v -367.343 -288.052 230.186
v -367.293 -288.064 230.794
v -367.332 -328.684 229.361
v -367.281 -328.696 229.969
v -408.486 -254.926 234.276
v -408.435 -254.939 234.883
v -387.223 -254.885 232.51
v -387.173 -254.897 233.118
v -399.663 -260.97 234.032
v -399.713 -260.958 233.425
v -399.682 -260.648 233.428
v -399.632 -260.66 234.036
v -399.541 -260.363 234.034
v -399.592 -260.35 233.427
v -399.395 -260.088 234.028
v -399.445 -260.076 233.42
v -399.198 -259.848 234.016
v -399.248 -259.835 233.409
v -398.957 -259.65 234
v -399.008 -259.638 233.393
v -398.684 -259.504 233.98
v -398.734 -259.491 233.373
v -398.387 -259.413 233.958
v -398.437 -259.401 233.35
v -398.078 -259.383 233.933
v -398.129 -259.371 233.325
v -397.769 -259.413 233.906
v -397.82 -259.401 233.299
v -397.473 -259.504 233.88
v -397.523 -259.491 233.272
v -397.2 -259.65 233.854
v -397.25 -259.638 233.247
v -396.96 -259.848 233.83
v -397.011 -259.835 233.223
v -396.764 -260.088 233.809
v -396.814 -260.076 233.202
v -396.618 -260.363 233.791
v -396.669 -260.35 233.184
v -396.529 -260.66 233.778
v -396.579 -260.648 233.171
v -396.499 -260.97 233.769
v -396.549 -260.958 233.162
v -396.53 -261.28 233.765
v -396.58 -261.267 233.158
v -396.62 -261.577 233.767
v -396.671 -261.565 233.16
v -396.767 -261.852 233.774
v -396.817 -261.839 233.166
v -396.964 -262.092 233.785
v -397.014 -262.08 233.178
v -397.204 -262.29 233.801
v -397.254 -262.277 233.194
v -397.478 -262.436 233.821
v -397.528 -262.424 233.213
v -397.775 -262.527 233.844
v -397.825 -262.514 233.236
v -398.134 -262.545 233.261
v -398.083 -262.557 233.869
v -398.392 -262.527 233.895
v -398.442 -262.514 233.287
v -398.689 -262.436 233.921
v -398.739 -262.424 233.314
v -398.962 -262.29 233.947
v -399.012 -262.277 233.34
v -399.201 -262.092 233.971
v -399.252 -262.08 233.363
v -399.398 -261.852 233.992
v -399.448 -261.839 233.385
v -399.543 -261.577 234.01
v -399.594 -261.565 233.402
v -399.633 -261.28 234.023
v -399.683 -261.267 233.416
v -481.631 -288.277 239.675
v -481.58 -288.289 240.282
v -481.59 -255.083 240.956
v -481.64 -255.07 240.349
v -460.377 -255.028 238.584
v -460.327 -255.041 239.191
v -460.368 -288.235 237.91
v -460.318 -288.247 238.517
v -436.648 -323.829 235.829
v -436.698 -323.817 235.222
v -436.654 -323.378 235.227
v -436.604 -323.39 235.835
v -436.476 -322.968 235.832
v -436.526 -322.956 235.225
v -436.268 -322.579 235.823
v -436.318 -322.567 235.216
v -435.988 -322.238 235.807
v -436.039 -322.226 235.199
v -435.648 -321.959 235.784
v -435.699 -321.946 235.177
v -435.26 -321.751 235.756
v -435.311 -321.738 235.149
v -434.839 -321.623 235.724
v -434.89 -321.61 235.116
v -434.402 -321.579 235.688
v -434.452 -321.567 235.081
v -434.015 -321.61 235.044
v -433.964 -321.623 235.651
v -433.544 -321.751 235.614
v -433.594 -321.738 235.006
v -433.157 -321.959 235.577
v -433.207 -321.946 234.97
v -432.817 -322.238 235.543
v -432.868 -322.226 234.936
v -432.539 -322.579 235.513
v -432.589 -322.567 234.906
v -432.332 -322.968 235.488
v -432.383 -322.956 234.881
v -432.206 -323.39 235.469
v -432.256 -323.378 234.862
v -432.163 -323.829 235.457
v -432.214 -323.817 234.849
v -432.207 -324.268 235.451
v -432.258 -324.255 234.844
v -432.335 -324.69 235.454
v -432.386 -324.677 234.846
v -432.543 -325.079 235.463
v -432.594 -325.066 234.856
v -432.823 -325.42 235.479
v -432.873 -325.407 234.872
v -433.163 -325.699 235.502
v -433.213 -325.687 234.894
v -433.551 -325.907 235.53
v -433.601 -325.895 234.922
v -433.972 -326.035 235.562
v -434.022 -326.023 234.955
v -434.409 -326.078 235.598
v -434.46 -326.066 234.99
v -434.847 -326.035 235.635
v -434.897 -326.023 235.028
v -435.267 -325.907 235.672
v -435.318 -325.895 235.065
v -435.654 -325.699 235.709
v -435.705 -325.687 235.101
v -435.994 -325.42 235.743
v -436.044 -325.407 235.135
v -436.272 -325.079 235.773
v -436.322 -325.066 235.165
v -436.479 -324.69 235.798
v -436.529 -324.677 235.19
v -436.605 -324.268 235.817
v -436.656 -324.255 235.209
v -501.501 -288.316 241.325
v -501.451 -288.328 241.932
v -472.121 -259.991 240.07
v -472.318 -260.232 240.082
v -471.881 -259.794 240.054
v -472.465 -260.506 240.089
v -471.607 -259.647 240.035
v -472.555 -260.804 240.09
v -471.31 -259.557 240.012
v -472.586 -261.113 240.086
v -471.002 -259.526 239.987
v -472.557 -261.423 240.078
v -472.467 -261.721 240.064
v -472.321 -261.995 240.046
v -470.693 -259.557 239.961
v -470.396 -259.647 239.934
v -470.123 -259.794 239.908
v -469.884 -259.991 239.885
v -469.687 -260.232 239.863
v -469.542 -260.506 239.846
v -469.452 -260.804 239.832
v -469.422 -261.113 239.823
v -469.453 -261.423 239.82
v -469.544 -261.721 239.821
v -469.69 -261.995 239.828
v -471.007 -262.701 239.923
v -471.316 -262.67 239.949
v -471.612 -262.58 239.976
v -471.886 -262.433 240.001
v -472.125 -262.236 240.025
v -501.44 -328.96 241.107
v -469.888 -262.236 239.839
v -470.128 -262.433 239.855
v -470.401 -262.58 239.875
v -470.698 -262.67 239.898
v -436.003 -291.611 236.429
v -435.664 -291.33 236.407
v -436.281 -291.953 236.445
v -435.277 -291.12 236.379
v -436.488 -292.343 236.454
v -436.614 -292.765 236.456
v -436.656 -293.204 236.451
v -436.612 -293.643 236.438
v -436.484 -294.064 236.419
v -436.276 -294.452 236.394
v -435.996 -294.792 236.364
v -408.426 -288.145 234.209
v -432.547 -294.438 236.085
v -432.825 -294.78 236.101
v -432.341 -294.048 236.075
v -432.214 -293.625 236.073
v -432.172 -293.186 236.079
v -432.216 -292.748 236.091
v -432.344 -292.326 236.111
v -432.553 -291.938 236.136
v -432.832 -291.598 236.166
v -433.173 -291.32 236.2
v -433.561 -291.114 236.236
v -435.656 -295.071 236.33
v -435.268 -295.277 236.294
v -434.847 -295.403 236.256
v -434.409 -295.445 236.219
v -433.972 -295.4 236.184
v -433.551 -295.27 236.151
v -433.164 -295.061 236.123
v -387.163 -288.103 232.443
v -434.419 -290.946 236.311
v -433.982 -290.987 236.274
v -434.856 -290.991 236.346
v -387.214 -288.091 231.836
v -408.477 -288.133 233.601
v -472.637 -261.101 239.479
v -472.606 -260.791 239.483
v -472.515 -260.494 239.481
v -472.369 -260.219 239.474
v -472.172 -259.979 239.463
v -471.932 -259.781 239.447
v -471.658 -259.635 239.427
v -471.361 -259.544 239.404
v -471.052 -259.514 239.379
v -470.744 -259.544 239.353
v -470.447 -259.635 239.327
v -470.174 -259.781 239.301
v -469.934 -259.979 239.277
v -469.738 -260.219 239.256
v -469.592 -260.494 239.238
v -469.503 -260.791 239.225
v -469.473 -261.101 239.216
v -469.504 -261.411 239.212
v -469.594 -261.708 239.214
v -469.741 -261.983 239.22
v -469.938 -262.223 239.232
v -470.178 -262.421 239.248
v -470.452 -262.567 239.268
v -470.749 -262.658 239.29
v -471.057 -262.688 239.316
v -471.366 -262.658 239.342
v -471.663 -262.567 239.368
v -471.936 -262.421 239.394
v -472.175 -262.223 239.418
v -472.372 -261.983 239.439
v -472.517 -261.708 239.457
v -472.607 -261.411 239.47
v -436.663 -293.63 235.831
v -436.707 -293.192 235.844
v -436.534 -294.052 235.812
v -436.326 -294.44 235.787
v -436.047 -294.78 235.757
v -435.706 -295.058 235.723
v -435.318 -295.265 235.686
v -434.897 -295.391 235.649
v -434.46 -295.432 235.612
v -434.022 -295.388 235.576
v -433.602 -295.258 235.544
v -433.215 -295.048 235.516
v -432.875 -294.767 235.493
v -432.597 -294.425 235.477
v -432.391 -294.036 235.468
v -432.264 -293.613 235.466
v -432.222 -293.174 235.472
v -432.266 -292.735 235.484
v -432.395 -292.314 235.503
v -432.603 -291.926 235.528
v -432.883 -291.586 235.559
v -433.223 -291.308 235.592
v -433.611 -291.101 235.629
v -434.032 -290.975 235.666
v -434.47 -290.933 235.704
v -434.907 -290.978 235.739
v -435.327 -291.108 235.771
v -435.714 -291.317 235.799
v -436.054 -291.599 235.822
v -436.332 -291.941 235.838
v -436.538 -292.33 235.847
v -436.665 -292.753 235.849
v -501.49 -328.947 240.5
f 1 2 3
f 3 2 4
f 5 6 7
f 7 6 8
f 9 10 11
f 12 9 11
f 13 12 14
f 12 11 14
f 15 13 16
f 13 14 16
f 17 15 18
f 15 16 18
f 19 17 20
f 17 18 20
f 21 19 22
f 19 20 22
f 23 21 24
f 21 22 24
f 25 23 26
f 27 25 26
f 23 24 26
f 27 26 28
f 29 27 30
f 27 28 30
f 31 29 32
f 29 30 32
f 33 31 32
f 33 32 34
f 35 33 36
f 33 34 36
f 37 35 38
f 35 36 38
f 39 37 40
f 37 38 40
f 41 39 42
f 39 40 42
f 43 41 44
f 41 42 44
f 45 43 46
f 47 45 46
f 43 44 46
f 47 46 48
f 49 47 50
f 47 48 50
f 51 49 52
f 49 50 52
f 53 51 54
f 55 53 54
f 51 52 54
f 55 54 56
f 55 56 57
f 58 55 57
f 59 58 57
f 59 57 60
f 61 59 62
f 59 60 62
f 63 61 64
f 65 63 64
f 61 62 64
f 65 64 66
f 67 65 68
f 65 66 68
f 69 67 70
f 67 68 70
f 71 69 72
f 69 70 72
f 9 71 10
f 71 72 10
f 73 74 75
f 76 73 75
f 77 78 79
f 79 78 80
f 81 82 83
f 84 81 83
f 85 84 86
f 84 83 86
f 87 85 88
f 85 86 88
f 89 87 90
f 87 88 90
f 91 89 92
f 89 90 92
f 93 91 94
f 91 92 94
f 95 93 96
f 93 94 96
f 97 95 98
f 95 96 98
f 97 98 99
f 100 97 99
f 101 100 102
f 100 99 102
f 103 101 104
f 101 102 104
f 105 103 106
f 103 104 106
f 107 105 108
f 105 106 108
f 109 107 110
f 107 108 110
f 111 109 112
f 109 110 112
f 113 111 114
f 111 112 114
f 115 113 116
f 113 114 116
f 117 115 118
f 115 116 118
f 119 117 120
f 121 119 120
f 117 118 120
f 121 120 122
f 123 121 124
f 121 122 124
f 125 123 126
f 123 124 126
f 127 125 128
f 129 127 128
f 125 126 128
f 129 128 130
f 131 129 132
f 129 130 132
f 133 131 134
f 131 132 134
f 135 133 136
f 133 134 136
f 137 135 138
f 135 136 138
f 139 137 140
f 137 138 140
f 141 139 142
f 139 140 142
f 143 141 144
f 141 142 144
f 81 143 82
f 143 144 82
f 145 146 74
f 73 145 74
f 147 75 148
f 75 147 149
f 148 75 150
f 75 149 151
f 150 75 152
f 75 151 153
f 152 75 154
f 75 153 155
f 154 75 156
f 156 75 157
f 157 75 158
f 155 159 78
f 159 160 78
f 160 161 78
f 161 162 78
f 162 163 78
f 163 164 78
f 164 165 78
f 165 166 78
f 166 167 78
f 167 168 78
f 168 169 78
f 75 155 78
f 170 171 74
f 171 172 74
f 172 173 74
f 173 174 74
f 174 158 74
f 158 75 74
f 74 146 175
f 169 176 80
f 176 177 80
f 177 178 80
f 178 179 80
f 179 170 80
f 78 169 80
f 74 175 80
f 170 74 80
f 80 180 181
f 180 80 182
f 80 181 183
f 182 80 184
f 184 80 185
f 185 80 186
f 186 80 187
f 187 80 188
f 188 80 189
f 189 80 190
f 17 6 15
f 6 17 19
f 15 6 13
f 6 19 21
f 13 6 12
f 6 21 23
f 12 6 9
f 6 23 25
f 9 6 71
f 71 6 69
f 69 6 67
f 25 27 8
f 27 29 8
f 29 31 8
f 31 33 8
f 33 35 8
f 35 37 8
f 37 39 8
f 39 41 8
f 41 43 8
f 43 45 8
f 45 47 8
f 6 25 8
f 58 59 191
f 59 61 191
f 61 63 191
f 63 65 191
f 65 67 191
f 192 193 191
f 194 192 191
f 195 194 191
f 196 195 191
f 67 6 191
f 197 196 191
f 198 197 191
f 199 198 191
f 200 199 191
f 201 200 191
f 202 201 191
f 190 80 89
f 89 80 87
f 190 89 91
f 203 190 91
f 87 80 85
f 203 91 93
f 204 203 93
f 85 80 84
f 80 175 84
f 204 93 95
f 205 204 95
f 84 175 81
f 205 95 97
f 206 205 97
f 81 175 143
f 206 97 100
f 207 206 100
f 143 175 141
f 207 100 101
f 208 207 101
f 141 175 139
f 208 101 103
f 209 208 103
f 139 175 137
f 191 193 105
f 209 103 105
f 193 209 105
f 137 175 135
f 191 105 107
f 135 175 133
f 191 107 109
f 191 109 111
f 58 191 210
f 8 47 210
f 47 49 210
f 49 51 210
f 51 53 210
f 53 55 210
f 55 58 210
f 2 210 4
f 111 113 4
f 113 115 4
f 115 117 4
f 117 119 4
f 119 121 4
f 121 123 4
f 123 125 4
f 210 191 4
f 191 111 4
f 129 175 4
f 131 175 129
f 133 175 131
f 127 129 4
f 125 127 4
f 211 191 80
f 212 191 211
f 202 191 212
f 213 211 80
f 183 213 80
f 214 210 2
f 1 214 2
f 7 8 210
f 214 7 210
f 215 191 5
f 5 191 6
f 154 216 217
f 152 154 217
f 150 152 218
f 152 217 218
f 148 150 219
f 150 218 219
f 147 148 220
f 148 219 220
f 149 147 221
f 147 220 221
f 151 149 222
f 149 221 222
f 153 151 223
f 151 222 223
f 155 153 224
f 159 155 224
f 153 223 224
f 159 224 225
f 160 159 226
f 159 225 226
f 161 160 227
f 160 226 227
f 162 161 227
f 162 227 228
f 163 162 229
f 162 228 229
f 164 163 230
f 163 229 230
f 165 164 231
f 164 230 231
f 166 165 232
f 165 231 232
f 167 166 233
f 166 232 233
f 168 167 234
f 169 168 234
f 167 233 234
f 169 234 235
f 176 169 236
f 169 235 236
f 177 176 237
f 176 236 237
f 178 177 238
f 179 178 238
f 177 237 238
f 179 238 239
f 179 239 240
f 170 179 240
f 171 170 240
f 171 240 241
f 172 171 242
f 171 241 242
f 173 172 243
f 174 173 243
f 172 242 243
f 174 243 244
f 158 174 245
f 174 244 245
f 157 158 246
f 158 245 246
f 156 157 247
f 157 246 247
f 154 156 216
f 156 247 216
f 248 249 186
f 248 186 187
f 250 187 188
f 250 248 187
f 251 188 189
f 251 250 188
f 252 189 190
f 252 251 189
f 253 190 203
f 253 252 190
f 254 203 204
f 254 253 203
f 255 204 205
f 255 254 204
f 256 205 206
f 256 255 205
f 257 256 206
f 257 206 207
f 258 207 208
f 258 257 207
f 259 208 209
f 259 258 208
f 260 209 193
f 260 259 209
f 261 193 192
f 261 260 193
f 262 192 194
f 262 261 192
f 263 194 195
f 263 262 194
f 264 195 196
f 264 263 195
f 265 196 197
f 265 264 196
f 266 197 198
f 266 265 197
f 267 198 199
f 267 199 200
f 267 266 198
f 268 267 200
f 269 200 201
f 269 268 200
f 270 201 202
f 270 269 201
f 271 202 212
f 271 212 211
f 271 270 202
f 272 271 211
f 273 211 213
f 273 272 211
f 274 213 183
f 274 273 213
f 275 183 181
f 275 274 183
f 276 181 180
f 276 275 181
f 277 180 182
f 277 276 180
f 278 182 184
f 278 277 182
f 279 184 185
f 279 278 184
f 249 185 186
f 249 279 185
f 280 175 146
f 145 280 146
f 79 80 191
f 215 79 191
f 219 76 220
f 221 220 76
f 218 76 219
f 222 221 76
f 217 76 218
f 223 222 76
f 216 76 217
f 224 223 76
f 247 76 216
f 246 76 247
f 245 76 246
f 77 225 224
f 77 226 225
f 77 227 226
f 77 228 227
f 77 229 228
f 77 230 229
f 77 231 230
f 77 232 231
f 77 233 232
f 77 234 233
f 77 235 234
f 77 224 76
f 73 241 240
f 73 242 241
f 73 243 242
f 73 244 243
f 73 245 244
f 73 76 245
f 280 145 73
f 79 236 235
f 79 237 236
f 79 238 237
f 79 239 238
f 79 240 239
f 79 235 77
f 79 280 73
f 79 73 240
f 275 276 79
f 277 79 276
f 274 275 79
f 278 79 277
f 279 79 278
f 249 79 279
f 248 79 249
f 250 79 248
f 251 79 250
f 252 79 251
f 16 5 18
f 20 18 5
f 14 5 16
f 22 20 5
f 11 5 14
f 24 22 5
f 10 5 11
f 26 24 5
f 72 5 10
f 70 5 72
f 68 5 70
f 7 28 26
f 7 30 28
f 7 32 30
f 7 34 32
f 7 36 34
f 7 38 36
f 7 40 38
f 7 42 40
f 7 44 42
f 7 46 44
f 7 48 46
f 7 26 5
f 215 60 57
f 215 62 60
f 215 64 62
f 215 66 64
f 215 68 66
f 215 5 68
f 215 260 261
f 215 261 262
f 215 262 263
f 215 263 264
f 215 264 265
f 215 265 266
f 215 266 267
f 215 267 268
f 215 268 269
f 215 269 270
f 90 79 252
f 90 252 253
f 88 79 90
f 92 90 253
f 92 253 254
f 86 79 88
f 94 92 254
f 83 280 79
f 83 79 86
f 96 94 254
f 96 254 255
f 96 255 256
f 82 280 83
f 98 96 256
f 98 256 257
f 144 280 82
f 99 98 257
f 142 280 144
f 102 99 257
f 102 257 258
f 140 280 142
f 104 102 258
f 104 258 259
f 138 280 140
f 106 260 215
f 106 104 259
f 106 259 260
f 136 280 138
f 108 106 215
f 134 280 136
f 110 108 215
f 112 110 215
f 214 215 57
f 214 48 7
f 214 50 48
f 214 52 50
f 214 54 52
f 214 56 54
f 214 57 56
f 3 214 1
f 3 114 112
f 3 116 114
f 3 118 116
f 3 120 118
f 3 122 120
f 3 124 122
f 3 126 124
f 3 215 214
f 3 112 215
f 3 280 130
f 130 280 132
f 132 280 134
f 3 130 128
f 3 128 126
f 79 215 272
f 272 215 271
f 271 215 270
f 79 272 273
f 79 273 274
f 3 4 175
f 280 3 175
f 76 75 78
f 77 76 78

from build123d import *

# Parameters (mm, degrees)
BOSS_EXTRUDE1_DEPTH = 0.6096
SKETCH5_R           = 2.25
CUT_EXTRUDE2_DEPTH  = 0.6096
SKETCH6_R           = 1.5875
CUT_EXTRUDE5_DEPTH  = 0.6096
SKETCH7_R           = 1.5875
CUT_EXTRUDE6_DEPTH  = 0.6096


with BuildPart() as part:
    # Sketch1 → Boss-Extrude1 (new body)
    with BuildSketch(Plane(origin=(16.997226787, -4.149929847, 204.631375634), x_dir=(0.9965694099183702, 0.001959509651517015, -0.0827379691367708), z_dir=(-0.08276069418699705, 0.02020630066742909, -0.9963645783100802))):
        Polygon((-405.631572024, 283.216979703), (-385.692572024, 283.216979703), (-385.692572024, 323.856979703), (-405.014358213, 323.856979703), (-432.414358217, 323.856979703), (-445.097076418, 323.856979703), (-465.359895626, 323.856979703), (-479.498480719, 323.856979703), (-500.373572024, 323.856979703), (-520.312572024, 323.856979703), (-520.312572024, 283.216979703), (-500.373572024, 283.216979703), (-500.373572024, 250.003685703), (-479.037572024, 250.003685703), (-479.037572024, 283.216979703), (-426.967572024, 283.216979703), (-426.967572024, 250.003685703), (-405.631572024, 250.003685703), align=None)
    extrude(amount=BOSS_EXTRUDE1_DEPTH)

    # Sketch5 → Cut-Extrude2 (cut)
    with BuildSketch(Plane(origin=(16.946775868, -4.137612086, 204.023991787), x_dir=(-0.9965694494101686, -0.0016780440853138524, 0.08274368054637986), z_dir=(-0.08276069418699686, 0.020206300667429084, -0.9963645783100801))):
        with Locations(Location((452.956635294, -318.984510283, 0), (0, 0, 0.096164523))):
            Circle(SKETCH5_R)
    cut_extrude2 = extrude(amount=-CUT_EXTRUDE2_DEPTH, mode=Mode.SUBTRACT)

    # Mirror1: Cut-Extrude2 across plane
    add(cut_extrude2.mirror(Plane(origin=(0.085159645, -303.474424262, -6.16154314), x_dir=(5.696257509048789e-06, -0.02029915071256956, 0.9997939509958544), z_dir=(0.00028055772663953236, -0.9997939116314238, -0.020299151511798782))), mode=Mode.SUBTRACT)

    # Sketch6 → Cut-Extrude5 (cut)
    with BuildSketch(Plane(origin=(16.946775868, -4.137612086, 204.023991787), x_dir=(-0.9965694494101686, -0.0016780440853136297, 0.08274368054637984), z_dir=(-0.08276069418699684, 0.02020630066742912, -0.9963645783100802))):
        with Locations(Location((416.50680125, -256.173836565, 0), (0, 0, 0.096164523))):
            Circle(SKETCH6_R)
    extrude(amount=-CUT_EXTRUDE5_DEPTH, mode=Mode.SUBTRACT)

    # Sketch7 → Cut-Extrude6 (cut)
    with BuildSketch(Plane(origin=(16.946775868, -4.137612086, 204.023991787), x_dir=(-0.9965694494101686, -0.0016780440853141857, 0.08274368054637986), z_dir=(-0.08276069418699686, 0.020206300667429056, -0.9963645783100801))):
        with Locations(Location((489.681466673, -256.194436956, 0), (0, 0, 0.096164523))):
            Circle(SKETCH7_R)
    extrude(amount=-CUT_EXTRUDE6_DEPTH, mode=Mode.SUBTRACT)


solid = part.part
